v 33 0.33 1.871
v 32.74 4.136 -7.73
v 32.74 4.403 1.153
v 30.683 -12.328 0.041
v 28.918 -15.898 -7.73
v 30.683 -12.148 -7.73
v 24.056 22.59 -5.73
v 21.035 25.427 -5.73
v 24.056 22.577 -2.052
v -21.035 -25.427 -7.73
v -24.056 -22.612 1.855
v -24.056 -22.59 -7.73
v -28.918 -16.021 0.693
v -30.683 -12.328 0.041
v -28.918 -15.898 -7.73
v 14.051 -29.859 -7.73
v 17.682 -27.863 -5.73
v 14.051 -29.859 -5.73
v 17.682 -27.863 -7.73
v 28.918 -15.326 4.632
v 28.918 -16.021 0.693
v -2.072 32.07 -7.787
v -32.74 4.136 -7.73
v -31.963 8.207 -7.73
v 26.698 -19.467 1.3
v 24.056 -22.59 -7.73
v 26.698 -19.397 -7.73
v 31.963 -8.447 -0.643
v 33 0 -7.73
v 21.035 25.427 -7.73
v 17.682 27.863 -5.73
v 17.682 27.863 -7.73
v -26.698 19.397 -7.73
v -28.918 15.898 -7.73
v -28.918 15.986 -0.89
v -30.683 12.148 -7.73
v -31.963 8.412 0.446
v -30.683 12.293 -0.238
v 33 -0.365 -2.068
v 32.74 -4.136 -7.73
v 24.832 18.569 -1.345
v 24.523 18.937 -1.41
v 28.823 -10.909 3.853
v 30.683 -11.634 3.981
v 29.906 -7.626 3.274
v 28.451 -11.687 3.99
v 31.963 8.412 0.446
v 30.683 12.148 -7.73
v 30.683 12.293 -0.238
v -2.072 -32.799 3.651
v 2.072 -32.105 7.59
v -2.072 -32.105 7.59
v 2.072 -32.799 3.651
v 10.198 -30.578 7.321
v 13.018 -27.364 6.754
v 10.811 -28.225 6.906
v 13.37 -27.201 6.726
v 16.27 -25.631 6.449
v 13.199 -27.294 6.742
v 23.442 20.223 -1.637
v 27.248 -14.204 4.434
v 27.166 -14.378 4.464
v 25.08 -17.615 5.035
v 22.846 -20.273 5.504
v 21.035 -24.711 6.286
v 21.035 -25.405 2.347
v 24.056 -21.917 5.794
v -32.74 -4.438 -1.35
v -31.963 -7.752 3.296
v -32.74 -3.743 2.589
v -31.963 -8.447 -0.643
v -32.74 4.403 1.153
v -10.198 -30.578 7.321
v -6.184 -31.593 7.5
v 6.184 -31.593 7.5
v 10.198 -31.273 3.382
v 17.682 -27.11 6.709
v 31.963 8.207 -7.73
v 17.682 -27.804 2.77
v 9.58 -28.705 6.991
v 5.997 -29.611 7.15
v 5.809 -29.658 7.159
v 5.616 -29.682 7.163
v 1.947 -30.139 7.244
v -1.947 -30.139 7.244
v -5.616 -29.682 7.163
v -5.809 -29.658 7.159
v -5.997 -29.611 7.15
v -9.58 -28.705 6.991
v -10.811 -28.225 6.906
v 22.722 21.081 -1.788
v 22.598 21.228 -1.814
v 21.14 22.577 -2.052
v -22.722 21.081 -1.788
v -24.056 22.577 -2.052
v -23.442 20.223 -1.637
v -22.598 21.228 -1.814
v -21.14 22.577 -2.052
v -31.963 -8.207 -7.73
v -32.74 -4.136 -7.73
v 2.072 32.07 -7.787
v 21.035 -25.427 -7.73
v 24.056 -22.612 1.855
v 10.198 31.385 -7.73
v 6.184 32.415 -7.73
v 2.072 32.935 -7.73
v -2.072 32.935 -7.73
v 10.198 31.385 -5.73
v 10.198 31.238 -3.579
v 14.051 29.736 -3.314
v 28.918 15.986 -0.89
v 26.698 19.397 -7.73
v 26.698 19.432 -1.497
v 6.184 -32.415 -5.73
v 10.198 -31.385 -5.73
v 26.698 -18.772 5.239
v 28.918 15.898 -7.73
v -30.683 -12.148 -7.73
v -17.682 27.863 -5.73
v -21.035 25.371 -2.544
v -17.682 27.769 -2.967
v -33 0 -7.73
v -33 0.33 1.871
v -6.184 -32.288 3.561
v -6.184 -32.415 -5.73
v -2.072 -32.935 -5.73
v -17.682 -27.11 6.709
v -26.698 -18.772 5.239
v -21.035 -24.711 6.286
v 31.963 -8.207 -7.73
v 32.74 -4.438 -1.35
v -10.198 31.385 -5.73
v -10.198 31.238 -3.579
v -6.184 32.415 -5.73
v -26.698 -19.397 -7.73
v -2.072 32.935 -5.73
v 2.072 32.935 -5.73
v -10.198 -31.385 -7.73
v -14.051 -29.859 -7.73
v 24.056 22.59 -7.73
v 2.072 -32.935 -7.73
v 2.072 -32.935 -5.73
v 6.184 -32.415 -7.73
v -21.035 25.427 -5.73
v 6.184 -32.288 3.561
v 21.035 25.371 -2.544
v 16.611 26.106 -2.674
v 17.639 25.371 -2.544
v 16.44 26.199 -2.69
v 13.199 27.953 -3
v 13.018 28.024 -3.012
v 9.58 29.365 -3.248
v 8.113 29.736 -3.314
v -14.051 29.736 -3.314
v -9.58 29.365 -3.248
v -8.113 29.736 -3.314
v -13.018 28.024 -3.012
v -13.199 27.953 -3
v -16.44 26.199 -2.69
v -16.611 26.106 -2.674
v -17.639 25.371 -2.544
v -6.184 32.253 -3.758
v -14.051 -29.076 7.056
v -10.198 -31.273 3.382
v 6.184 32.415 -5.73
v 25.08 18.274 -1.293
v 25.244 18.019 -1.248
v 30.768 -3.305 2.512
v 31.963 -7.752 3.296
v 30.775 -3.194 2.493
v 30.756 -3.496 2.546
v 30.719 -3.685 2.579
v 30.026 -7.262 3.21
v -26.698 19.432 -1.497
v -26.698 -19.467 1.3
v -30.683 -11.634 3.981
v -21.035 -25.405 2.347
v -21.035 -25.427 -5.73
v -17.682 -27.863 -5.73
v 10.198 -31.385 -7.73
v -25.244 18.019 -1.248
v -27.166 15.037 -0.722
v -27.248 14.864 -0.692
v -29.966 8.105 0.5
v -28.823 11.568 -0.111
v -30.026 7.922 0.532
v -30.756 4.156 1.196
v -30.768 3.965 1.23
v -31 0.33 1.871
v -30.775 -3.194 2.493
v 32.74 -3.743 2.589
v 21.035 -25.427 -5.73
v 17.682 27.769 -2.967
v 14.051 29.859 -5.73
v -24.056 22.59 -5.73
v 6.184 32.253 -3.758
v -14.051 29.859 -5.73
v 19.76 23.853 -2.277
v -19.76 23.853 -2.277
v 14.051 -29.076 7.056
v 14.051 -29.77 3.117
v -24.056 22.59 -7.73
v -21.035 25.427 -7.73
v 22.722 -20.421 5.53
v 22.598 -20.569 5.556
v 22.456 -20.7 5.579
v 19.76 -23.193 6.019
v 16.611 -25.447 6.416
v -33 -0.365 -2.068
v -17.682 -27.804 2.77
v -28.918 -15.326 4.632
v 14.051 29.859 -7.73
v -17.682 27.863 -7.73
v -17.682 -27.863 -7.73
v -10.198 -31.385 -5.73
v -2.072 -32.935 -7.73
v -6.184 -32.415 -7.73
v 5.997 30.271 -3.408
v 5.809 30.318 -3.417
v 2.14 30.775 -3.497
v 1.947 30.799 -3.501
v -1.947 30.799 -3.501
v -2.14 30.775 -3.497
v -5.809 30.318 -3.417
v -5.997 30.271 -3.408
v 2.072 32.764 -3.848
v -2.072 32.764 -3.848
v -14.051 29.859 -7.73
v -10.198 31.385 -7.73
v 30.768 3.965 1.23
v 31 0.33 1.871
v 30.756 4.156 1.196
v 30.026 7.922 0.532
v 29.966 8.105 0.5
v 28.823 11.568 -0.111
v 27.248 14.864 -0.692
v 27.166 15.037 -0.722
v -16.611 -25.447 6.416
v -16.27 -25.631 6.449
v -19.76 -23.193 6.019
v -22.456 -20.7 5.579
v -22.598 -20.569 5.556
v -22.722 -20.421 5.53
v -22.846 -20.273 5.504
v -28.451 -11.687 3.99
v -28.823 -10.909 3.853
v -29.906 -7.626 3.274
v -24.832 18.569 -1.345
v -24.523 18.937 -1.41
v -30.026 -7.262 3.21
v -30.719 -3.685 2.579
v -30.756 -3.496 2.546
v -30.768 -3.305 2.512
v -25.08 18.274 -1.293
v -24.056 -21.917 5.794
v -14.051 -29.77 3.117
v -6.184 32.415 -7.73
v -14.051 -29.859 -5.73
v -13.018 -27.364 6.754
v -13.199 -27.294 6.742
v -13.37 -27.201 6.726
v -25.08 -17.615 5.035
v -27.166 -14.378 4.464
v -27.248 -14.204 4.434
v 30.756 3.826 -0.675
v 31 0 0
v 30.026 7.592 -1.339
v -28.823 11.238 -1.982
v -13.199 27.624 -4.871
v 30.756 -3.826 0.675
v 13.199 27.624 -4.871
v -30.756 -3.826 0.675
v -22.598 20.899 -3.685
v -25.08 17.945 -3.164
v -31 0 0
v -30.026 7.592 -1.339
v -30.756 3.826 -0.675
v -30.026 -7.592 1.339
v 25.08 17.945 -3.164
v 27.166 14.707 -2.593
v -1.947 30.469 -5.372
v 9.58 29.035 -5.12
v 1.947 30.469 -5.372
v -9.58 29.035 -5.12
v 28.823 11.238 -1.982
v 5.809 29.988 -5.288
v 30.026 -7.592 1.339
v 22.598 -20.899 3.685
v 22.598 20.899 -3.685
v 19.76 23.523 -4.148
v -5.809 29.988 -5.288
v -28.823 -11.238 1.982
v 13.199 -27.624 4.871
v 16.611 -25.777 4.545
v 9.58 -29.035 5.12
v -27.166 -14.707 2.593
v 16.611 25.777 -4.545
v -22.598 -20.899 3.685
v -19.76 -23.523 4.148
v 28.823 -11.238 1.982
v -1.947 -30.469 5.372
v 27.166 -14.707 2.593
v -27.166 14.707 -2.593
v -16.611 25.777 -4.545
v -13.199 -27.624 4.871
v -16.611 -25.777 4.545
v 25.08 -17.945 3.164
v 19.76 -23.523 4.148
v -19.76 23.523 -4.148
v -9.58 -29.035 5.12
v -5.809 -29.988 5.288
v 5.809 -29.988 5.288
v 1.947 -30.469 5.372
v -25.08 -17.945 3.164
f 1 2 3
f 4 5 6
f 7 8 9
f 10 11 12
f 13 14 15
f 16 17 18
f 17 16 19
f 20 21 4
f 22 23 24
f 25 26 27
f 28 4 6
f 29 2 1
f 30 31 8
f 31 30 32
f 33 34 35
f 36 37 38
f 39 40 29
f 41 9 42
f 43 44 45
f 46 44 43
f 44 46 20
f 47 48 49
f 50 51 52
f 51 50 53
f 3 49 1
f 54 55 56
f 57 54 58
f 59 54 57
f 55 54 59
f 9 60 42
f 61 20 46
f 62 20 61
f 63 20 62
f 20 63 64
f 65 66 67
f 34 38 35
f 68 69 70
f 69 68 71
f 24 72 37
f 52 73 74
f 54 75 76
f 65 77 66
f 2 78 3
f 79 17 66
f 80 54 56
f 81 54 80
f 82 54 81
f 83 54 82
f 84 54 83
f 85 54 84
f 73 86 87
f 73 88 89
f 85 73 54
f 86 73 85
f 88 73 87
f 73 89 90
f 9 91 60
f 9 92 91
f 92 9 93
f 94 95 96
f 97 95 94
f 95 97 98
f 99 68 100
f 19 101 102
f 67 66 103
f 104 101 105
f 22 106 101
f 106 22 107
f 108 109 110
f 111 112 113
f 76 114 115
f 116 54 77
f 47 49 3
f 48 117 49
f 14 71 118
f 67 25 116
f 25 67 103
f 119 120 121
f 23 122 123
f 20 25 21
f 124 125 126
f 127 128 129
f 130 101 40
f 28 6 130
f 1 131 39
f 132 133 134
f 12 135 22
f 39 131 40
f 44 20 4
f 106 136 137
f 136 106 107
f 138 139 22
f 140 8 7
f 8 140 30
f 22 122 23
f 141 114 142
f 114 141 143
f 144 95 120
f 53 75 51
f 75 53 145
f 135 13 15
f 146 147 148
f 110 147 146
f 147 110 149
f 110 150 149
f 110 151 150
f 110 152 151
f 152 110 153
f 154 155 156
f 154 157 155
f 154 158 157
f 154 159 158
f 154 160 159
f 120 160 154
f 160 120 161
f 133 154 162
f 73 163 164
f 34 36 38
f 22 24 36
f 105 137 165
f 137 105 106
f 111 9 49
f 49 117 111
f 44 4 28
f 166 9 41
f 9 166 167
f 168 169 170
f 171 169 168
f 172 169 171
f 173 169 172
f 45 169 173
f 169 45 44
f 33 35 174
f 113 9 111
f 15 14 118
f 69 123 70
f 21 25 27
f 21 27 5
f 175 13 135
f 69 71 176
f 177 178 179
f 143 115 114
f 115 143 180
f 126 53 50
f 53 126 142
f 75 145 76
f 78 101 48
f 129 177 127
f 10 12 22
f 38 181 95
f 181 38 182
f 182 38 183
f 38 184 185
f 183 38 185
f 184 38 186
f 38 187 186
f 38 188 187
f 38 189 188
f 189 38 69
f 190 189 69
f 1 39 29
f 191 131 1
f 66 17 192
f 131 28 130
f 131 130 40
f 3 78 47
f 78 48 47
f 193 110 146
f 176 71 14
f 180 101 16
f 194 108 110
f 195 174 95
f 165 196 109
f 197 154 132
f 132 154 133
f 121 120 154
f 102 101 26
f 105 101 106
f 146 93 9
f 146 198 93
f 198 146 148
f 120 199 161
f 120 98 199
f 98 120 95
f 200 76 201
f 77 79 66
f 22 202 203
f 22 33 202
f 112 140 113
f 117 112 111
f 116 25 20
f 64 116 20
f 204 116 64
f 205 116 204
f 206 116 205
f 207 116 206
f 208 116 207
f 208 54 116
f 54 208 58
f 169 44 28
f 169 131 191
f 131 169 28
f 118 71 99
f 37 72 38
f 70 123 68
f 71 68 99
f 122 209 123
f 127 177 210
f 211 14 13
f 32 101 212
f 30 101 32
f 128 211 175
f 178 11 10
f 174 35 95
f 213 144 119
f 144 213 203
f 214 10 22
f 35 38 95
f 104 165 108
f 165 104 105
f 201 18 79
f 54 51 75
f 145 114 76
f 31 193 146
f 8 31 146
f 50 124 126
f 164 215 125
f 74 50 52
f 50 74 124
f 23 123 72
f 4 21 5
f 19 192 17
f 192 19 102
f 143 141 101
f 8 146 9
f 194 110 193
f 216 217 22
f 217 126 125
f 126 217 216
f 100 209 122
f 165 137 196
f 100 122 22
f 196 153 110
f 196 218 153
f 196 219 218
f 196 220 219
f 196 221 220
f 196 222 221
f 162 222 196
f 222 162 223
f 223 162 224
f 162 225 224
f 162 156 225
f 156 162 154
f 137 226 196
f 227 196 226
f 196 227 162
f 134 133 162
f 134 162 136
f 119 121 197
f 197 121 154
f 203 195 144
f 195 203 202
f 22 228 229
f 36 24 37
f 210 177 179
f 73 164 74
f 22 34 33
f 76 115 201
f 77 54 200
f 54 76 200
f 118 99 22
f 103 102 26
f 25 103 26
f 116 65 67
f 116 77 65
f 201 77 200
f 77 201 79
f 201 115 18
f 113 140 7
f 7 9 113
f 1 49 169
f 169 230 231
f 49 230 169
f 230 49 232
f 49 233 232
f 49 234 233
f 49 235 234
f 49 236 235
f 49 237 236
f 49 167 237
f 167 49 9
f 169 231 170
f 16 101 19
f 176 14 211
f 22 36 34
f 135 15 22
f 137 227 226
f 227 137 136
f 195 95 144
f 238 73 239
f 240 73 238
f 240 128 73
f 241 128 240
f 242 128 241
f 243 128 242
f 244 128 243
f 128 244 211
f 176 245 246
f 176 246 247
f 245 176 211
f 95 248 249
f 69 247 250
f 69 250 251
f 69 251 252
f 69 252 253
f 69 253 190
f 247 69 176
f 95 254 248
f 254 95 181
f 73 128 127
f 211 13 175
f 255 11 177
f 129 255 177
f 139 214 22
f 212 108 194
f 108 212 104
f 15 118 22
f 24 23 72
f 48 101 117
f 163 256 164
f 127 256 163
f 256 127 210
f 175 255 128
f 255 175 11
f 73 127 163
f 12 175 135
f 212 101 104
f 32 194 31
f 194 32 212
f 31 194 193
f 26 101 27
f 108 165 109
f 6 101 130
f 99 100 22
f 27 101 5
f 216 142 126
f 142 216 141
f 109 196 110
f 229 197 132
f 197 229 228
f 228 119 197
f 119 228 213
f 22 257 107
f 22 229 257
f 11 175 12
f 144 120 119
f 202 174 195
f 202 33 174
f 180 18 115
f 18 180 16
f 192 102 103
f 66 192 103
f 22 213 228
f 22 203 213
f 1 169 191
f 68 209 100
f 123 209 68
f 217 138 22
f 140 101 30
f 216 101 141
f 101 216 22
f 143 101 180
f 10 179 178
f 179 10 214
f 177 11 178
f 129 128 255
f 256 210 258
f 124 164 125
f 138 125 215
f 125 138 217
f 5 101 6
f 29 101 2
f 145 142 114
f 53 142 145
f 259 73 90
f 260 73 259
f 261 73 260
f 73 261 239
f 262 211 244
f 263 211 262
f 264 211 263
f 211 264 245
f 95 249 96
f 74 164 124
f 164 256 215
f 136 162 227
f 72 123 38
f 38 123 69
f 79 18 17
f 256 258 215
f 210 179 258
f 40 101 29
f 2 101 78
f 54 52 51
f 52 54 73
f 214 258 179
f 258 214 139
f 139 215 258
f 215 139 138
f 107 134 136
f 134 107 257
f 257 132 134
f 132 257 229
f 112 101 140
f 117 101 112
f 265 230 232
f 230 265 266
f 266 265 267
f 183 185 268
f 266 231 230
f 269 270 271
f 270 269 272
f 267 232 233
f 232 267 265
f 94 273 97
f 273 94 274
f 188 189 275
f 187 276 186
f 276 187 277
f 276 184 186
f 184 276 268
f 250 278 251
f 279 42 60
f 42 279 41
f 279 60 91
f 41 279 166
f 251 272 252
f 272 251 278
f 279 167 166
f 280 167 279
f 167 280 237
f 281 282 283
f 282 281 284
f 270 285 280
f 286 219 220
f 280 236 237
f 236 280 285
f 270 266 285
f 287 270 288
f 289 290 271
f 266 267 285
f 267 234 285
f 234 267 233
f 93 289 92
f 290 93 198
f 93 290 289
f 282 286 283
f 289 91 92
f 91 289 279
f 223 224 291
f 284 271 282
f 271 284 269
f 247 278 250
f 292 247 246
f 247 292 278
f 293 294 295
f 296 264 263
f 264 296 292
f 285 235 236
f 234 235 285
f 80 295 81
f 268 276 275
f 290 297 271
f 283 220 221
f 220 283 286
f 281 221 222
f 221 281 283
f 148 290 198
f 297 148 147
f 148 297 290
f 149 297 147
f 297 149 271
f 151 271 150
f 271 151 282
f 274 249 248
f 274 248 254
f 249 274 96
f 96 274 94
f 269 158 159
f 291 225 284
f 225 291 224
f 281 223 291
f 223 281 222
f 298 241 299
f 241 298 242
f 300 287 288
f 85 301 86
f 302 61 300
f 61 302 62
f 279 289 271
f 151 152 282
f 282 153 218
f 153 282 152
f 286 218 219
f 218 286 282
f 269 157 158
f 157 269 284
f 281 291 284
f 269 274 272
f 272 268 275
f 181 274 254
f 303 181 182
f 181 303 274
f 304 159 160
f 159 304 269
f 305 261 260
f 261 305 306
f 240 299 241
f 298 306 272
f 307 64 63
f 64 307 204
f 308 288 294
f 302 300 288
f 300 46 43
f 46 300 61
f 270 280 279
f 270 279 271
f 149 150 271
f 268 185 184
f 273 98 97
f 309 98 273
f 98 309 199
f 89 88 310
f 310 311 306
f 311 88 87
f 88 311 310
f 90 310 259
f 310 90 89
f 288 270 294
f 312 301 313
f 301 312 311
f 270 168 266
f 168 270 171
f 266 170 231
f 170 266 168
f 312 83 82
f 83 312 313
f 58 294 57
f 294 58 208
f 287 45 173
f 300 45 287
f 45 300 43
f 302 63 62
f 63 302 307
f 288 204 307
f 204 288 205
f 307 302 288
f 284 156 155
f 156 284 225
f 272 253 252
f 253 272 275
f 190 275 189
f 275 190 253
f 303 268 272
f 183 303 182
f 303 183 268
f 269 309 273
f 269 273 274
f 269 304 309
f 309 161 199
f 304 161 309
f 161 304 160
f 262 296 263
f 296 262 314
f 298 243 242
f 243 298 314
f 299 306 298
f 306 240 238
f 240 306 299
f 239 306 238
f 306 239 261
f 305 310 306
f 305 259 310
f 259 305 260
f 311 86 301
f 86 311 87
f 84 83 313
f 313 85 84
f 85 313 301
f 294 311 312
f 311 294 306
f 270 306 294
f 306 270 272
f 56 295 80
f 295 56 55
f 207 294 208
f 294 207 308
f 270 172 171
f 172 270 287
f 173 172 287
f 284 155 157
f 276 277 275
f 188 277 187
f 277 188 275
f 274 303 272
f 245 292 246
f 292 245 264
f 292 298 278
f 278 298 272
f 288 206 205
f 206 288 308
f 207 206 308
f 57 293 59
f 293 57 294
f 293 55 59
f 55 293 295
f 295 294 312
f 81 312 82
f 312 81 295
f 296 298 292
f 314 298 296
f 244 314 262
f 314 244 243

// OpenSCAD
$fn=50;
r_cap=62/2;
d=2;

difference() {
hull() {
rotate([-10,0,0]) {
    translate([0,0,-d-0.1])
cylinder(r=r_cap+d, h=d*2);
}
translate([0,0,-sin(10)*(r_cap+d)-d])
cylinder(r=r_cap+d, h=d);
}

rotate([-10,0,0]) {
    cylinder(r=r_cap, h=d);
}
}
